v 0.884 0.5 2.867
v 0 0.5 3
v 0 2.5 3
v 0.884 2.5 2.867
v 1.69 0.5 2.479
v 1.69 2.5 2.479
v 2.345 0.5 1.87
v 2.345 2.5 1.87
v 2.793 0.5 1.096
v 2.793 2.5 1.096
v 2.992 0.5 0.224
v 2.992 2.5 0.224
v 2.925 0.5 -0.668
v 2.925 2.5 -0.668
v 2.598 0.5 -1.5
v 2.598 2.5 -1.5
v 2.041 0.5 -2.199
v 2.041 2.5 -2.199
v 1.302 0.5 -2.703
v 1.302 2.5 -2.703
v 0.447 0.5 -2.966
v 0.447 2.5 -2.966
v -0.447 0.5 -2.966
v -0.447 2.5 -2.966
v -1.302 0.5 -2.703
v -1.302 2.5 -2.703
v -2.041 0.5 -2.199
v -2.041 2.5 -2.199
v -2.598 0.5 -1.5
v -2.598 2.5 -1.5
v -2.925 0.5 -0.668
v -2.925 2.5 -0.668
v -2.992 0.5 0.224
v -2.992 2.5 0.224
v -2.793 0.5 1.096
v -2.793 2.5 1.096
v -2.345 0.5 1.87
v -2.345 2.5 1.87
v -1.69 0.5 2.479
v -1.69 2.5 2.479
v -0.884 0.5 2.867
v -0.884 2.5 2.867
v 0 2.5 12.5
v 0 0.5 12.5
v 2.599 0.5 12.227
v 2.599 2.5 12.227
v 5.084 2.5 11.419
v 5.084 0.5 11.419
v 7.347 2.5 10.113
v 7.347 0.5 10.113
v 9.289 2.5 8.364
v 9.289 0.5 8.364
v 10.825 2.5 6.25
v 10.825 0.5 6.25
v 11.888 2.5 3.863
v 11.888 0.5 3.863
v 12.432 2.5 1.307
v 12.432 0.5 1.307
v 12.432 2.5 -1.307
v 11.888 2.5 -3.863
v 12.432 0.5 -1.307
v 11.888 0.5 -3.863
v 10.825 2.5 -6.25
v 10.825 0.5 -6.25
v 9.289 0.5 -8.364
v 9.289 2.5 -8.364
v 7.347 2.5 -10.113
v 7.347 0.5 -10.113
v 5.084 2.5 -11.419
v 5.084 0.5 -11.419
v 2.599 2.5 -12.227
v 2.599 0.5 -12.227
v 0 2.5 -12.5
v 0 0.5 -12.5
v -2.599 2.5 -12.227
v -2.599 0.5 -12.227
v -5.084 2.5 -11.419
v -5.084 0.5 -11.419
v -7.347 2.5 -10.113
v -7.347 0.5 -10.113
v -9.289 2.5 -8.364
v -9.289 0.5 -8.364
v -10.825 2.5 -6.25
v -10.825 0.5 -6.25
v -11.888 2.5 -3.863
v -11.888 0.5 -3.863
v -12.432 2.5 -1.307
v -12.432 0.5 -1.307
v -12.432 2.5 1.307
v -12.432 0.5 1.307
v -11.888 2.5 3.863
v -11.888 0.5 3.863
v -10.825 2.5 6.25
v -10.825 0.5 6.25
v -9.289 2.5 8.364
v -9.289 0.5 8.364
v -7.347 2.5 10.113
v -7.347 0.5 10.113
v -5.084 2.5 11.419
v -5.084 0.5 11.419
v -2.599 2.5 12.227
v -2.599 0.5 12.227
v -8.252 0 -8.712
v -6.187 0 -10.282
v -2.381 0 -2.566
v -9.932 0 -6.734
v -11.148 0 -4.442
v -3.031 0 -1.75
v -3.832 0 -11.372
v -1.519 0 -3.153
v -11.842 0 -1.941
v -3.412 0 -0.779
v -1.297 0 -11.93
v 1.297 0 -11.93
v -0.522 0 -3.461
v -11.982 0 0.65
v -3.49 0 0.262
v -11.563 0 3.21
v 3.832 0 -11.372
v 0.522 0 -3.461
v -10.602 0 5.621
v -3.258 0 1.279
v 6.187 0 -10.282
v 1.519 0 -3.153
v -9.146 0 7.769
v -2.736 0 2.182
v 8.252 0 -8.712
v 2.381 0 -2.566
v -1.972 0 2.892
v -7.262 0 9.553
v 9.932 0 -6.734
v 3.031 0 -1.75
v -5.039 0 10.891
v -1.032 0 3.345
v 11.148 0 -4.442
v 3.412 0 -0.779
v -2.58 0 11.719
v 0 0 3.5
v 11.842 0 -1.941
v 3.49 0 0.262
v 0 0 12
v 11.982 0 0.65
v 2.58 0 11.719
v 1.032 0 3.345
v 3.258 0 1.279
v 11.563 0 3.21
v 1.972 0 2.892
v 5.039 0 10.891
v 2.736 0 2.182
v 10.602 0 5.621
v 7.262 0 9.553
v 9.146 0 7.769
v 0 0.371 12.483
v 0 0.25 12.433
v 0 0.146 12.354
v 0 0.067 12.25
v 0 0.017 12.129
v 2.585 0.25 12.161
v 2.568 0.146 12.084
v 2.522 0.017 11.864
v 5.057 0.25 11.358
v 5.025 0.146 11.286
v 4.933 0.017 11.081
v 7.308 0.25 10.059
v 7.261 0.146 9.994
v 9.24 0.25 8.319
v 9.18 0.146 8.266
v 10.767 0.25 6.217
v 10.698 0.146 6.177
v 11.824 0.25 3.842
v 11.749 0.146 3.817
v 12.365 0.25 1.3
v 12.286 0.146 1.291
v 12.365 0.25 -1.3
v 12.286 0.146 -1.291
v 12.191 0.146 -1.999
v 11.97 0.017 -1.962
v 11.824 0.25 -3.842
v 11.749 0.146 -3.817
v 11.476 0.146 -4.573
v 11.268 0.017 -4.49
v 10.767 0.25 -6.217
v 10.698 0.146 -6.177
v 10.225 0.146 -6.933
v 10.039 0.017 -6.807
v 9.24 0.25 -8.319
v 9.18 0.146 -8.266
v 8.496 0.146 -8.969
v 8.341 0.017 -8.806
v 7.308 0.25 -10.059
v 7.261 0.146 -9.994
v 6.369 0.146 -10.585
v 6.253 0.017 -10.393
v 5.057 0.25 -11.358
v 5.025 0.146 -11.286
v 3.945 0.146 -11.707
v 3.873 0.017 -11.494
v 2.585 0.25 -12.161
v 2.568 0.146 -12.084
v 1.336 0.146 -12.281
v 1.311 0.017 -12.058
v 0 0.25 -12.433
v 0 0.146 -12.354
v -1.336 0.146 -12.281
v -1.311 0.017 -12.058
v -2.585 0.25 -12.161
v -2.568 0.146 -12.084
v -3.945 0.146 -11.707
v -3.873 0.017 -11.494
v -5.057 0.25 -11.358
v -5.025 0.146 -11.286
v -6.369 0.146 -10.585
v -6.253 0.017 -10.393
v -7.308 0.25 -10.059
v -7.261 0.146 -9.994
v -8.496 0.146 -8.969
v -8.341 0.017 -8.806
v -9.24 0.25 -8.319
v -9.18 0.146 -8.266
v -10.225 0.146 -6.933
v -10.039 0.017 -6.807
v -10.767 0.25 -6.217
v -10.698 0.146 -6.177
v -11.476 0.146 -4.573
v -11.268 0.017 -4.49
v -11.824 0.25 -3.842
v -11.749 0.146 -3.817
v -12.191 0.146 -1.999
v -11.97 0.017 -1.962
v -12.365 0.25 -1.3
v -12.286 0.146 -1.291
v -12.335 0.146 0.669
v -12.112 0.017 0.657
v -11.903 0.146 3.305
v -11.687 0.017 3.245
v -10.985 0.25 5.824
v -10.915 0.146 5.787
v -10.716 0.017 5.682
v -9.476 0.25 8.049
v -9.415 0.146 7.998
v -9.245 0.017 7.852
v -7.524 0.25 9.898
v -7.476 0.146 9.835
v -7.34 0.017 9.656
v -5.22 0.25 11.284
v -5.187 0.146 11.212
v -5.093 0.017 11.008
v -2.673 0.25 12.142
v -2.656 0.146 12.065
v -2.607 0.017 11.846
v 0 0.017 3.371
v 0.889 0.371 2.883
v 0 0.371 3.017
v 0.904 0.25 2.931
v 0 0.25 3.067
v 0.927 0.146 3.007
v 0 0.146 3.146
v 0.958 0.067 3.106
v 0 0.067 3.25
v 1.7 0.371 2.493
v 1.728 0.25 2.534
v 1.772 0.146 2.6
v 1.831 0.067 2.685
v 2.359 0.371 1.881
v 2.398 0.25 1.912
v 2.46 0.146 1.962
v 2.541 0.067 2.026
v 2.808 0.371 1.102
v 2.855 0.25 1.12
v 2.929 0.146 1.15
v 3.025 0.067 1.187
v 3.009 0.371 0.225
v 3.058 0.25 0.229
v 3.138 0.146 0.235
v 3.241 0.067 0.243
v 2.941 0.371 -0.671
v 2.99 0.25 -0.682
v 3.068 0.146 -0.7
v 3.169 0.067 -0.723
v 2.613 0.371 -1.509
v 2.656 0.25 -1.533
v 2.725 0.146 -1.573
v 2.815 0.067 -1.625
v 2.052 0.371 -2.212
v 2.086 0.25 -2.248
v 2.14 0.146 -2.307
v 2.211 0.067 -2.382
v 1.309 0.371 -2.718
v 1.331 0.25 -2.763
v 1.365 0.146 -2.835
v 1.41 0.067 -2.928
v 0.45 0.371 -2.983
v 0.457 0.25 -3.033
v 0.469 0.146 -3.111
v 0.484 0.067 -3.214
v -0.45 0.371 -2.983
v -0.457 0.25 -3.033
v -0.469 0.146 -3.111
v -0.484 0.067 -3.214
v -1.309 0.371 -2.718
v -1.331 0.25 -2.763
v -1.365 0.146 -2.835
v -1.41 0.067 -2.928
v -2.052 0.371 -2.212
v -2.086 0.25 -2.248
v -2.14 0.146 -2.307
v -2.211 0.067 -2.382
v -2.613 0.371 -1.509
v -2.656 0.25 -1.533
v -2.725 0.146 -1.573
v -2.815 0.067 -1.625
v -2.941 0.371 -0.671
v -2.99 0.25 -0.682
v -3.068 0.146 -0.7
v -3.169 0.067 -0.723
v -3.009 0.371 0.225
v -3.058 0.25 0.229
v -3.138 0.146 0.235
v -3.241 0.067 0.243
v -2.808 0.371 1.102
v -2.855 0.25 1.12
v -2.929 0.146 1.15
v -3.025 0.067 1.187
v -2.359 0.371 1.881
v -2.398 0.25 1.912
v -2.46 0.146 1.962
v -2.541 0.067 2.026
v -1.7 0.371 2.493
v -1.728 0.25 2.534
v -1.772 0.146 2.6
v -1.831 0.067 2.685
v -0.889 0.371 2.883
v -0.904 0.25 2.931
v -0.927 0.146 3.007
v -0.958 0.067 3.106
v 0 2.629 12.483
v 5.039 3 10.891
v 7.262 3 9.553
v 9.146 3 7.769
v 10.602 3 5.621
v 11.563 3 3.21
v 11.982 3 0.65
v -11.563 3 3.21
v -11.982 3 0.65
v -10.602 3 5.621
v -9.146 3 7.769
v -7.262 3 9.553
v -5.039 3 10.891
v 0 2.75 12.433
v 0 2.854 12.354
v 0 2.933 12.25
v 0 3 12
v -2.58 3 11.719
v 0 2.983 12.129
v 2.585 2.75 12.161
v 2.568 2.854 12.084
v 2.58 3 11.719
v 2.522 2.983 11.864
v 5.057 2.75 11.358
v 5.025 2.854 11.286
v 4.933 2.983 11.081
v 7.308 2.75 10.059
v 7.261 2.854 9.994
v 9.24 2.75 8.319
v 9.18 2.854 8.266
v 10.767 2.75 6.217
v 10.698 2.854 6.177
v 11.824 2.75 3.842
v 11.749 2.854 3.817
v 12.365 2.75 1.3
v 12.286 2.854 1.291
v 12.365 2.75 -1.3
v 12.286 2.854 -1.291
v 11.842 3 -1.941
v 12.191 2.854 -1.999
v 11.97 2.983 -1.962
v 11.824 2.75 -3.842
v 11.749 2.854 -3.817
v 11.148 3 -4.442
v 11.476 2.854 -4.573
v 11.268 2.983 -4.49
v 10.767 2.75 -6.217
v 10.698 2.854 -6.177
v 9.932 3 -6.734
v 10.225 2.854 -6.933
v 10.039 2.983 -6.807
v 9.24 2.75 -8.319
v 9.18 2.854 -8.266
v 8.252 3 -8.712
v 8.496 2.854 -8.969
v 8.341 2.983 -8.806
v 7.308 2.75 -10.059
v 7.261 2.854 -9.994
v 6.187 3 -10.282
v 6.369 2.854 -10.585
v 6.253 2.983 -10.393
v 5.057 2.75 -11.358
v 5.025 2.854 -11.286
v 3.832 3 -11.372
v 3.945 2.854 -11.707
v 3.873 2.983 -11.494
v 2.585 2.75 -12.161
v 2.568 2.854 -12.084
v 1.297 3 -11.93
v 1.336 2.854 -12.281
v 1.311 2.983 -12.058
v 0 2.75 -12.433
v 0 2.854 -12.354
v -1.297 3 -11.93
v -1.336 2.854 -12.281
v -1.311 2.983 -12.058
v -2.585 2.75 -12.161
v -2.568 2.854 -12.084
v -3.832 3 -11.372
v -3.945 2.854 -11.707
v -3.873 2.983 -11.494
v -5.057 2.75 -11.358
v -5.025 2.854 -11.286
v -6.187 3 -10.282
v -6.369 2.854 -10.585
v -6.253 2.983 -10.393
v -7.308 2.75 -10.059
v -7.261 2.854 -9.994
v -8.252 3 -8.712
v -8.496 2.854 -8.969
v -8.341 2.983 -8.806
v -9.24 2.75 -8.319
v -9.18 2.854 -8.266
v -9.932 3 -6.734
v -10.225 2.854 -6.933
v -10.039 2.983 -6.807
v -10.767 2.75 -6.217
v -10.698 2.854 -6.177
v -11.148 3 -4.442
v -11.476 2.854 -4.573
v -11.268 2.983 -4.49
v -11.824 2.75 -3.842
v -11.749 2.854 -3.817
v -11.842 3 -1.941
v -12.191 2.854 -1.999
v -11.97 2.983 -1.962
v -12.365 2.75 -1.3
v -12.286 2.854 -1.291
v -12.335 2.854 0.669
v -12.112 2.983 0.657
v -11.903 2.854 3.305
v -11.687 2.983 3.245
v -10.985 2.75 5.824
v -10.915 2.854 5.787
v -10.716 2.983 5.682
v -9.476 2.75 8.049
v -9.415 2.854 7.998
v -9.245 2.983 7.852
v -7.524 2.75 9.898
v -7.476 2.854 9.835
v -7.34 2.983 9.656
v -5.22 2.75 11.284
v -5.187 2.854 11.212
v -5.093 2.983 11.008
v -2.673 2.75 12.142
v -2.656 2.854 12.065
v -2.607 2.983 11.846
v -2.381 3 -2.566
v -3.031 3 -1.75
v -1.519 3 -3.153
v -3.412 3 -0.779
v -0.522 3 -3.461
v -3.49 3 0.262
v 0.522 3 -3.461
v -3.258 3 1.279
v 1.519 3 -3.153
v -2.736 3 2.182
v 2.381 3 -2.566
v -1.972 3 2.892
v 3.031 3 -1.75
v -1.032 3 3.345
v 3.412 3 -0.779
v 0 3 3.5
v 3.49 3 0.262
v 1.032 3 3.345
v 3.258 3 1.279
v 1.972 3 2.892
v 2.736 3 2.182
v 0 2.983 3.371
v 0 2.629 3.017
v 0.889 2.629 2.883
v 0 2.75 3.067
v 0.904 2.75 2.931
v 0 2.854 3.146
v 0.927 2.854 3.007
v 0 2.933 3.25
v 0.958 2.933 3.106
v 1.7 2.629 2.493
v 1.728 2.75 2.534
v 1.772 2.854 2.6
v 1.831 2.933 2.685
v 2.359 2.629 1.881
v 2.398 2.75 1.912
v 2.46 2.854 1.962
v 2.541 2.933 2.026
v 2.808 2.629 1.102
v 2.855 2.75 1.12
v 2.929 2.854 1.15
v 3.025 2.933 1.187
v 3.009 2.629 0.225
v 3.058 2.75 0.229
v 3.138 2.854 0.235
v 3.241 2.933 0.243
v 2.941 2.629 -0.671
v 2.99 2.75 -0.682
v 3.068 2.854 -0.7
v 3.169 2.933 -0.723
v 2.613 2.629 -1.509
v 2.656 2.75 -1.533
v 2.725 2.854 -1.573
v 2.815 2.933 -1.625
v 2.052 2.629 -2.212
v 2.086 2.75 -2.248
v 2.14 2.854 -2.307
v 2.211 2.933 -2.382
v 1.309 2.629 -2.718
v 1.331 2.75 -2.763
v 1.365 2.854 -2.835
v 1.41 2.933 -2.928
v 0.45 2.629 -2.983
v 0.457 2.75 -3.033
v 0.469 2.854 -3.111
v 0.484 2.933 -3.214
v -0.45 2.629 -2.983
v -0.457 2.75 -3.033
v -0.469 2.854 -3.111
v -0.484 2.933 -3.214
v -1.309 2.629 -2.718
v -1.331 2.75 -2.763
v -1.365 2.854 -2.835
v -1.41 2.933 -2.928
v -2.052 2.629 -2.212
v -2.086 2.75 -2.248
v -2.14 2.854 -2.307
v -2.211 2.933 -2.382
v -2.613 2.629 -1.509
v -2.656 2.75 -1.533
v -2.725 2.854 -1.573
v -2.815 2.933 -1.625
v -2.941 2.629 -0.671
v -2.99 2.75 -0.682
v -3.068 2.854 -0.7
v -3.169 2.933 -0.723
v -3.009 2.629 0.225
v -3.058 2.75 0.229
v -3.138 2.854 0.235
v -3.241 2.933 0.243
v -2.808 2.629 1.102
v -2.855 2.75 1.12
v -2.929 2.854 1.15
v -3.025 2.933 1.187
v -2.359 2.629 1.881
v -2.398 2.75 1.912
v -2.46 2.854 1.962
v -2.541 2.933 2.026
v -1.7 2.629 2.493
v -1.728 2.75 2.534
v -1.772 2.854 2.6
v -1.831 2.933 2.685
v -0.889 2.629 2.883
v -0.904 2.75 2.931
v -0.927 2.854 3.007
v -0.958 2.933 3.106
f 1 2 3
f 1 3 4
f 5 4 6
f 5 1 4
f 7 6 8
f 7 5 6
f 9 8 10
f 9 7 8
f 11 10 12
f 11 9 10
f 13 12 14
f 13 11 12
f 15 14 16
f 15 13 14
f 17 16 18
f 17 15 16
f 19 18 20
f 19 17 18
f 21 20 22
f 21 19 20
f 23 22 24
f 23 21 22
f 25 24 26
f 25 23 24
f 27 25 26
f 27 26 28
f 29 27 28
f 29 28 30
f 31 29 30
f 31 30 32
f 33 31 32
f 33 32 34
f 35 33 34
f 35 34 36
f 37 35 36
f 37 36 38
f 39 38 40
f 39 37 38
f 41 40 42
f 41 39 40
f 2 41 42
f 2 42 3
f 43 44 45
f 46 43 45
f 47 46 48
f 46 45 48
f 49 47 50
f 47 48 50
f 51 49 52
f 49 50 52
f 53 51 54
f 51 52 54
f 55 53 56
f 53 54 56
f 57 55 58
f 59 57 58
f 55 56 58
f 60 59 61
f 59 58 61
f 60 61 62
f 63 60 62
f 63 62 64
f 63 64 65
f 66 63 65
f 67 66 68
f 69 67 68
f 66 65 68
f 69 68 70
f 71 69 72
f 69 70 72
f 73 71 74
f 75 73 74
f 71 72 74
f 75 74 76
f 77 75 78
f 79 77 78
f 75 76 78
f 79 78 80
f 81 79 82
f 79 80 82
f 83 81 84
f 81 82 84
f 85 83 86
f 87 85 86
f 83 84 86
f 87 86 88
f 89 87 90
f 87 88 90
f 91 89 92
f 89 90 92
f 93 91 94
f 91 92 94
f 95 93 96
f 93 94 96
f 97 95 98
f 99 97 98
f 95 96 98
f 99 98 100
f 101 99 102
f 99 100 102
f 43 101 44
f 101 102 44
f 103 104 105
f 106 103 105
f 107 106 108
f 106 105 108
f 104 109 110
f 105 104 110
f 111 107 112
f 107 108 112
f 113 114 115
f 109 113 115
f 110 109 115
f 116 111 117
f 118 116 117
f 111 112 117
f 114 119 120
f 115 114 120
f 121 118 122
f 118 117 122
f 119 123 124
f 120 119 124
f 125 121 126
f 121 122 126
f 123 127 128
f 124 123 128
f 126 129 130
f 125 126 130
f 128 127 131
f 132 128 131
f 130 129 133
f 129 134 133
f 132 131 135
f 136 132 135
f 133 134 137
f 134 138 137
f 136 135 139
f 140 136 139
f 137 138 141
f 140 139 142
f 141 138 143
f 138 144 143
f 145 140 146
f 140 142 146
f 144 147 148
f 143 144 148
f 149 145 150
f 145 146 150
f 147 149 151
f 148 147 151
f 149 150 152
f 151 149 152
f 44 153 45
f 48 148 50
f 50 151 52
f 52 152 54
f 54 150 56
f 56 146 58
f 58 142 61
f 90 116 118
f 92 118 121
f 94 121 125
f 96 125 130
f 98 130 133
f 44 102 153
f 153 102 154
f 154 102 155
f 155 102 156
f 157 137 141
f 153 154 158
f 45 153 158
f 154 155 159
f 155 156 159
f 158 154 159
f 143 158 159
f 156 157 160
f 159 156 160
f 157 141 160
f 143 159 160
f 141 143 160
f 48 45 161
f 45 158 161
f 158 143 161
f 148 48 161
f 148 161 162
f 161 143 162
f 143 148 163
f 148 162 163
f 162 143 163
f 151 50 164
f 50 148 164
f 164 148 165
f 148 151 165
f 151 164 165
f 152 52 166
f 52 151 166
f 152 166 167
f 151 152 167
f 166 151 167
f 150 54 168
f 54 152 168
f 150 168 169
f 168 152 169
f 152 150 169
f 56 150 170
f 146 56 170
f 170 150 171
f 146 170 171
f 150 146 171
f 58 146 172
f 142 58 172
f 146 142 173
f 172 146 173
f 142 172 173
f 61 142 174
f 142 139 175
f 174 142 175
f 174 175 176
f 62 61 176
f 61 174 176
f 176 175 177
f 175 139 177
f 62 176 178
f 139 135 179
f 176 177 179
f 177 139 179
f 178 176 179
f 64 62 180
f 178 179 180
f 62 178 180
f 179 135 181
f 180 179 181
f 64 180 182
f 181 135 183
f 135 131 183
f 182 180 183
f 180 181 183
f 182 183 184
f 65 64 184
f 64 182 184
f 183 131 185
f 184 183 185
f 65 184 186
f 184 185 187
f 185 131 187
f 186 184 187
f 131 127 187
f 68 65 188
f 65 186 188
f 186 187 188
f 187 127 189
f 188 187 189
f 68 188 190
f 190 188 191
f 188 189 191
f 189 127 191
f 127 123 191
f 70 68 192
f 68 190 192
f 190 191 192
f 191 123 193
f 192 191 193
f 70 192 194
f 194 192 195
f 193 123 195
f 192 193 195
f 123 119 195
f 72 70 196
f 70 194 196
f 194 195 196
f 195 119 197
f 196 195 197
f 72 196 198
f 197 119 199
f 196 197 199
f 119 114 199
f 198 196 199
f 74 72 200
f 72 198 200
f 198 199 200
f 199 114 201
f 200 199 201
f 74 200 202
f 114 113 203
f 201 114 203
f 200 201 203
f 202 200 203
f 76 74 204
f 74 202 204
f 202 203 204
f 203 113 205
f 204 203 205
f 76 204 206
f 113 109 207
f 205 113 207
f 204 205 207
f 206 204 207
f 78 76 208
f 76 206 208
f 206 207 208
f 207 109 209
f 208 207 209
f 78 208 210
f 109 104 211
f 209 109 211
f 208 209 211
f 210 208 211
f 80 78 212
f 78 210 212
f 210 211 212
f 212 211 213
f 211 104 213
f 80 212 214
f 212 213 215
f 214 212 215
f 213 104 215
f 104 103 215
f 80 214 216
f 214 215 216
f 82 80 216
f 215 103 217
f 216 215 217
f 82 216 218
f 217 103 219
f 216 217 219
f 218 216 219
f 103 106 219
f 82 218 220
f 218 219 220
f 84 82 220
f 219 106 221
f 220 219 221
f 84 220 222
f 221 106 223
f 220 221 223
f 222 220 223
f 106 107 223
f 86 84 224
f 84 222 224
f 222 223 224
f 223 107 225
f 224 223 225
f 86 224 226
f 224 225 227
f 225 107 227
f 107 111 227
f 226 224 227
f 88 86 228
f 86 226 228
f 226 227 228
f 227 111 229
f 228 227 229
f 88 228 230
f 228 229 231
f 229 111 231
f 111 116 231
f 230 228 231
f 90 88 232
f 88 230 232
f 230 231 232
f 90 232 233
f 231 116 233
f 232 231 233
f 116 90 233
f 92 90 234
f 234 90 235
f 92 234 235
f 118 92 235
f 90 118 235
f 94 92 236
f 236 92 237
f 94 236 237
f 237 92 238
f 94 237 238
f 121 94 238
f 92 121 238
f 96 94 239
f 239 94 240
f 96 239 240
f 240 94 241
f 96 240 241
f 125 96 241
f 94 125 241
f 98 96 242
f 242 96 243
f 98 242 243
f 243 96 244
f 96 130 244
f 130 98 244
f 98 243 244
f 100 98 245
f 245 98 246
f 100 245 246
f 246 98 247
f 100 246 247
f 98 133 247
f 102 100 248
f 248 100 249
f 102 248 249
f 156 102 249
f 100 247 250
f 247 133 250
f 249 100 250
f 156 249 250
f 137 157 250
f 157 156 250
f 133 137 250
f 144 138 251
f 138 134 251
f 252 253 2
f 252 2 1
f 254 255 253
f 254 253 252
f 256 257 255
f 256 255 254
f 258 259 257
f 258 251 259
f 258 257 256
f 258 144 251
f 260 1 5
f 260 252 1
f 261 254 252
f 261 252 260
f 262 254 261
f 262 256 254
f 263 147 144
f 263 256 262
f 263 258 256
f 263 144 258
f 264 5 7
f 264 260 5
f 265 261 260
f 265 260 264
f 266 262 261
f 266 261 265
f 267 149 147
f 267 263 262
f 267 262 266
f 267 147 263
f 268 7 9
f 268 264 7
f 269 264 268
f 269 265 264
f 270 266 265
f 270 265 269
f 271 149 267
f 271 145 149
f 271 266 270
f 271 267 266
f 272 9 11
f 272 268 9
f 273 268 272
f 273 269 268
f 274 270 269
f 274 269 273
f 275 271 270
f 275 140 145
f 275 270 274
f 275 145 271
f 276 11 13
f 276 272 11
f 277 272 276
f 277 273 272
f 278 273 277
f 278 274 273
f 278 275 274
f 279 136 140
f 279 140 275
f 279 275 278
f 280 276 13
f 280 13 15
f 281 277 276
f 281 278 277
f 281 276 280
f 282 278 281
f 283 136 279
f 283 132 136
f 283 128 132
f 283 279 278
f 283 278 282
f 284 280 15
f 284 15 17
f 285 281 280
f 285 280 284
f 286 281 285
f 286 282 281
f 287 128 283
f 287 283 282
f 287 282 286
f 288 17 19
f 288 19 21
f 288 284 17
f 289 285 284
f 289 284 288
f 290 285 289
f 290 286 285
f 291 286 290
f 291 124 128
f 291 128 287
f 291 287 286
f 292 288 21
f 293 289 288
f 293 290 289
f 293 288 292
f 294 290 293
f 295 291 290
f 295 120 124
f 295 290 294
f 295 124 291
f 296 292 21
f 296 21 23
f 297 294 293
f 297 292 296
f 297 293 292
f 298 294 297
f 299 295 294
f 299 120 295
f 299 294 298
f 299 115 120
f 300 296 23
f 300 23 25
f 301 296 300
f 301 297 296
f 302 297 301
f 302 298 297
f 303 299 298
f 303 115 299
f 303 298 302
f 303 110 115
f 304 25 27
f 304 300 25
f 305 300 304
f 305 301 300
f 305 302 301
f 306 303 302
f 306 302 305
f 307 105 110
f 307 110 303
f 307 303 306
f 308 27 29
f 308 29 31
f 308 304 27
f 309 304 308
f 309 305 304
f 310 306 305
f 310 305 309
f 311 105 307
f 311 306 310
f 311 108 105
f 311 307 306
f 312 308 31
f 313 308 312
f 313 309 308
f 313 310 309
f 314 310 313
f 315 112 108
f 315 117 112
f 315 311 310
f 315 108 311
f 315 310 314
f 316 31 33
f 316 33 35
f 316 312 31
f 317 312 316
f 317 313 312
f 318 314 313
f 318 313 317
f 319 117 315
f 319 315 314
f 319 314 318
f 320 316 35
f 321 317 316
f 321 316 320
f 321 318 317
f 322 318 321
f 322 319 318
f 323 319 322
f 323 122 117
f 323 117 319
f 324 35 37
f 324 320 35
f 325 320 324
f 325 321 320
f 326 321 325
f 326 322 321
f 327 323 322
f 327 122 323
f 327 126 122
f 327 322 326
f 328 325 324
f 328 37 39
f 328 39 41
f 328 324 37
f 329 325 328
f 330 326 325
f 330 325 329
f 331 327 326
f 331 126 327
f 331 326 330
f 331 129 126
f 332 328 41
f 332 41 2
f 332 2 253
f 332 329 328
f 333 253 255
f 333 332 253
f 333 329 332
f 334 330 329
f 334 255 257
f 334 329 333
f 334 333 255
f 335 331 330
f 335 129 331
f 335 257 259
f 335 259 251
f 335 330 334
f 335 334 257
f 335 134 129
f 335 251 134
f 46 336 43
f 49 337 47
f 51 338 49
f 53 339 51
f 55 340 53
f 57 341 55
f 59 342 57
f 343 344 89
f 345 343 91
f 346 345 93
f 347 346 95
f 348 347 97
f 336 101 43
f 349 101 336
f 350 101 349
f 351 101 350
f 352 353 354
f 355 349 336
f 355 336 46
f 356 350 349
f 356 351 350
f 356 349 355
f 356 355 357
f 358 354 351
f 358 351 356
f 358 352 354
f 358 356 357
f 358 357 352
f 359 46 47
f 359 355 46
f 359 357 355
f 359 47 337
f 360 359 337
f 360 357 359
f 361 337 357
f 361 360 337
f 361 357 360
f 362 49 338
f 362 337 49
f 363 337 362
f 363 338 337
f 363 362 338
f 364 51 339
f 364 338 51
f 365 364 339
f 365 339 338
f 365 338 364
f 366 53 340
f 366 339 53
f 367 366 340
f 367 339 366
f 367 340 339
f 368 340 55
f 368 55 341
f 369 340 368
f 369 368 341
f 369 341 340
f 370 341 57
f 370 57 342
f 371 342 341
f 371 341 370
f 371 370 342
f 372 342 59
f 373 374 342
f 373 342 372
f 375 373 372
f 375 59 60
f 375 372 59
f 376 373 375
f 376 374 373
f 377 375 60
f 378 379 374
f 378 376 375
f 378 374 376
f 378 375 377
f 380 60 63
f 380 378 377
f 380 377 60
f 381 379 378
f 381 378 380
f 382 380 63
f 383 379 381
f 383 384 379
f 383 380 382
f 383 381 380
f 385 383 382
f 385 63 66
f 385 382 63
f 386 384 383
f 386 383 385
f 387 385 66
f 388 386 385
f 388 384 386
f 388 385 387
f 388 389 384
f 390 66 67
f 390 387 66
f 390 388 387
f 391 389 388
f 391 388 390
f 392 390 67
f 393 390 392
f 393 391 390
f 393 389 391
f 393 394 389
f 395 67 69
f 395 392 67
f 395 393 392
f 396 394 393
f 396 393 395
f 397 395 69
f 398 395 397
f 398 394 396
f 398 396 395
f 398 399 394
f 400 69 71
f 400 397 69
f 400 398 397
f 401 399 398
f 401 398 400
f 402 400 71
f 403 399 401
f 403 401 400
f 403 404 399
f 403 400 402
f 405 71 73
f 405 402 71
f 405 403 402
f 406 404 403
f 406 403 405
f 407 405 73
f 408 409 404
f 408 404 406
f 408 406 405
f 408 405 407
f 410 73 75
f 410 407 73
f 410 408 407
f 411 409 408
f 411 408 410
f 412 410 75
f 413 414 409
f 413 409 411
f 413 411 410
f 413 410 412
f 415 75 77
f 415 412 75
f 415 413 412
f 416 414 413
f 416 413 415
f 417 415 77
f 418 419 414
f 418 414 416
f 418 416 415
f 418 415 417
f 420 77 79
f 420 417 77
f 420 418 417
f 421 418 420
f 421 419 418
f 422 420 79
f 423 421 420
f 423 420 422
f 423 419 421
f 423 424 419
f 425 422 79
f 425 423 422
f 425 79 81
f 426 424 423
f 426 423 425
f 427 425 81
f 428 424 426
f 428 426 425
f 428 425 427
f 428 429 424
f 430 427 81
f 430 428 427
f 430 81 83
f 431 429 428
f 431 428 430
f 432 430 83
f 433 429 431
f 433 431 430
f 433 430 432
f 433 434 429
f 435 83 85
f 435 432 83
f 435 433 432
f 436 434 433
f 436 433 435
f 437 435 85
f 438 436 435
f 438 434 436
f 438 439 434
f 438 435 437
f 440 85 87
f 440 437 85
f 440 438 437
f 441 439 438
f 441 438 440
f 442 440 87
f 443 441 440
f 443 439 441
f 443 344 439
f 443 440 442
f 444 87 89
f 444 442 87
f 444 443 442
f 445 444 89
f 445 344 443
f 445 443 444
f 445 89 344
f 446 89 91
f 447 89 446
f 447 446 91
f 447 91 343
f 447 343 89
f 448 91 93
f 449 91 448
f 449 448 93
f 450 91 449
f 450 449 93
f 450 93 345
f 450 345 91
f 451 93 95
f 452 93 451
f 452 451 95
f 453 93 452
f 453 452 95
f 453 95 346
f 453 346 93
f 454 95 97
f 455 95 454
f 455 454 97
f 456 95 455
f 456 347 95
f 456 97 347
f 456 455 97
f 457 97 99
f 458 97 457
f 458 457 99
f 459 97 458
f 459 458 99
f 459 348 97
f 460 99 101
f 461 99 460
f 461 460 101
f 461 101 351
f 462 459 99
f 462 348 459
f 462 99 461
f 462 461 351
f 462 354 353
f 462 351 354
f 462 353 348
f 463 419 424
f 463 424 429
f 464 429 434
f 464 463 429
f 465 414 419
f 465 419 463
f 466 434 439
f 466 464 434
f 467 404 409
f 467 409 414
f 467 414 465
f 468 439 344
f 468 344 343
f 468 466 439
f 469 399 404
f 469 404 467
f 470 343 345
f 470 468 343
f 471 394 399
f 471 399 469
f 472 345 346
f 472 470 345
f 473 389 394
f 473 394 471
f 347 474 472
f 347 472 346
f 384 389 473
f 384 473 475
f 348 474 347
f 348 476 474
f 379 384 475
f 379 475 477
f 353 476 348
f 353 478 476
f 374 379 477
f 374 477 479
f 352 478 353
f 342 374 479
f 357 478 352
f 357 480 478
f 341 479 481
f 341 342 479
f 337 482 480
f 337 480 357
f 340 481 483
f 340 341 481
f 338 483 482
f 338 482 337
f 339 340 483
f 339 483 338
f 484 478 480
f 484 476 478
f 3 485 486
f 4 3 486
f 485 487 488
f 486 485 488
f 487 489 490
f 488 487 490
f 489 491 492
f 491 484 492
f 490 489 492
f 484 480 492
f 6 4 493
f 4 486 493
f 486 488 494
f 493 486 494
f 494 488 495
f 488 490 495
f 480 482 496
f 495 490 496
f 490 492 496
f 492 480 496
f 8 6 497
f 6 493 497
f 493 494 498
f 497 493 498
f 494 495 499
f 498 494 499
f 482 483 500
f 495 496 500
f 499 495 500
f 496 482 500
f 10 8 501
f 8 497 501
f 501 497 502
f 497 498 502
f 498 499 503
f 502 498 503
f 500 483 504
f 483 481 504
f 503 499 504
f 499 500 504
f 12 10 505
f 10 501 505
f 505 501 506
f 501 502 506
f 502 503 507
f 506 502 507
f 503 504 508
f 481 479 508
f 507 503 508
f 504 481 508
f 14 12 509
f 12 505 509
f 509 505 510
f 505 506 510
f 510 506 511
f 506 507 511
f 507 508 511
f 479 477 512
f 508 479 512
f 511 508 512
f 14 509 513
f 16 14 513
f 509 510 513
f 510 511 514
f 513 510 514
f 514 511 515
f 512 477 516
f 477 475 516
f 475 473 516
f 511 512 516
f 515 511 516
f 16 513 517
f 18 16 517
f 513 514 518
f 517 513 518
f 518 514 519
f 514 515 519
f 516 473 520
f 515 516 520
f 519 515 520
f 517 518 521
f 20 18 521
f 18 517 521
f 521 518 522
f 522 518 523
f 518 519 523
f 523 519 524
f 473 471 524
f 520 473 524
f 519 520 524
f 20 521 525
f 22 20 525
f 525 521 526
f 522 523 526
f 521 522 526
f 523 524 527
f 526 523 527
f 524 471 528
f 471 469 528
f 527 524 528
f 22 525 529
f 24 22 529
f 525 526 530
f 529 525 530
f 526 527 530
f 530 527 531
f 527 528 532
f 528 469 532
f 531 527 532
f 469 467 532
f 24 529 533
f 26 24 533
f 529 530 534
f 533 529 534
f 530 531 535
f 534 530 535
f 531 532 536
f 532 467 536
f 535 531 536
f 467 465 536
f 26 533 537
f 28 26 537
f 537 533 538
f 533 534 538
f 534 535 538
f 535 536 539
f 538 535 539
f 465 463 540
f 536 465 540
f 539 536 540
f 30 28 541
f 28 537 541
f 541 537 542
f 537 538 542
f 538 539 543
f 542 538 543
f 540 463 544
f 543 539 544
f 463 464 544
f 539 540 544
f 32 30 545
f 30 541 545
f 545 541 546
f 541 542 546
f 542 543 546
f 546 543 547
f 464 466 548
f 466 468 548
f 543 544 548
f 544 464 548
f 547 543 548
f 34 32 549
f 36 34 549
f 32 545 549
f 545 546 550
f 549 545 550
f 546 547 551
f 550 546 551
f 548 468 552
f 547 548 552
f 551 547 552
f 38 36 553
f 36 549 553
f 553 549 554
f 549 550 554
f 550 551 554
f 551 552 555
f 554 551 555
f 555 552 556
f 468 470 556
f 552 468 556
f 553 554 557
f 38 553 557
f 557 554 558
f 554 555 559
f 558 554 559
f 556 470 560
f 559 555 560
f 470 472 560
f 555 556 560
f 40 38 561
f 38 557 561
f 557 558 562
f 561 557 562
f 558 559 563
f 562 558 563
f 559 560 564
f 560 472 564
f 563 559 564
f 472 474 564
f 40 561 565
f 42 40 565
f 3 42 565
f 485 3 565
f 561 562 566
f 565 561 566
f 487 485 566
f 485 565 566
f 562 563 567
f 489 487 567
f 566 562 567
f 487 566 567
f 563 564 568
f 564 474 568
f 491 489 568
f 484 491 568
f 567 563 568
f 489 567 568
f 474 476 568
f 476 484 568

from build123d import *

# Parameters (mm, degrees)
CROQUIS1_R              = 12.5
CROQUIS1_R_2            = 3
SALIENTE_EXTRUIR1_DEPTH = 3
REDONDEO1_R             = 0.5


with BuildPart() as part:
    # Croquis1 → Saliente-Extruir1 (new body)
    with BuildSketch(Plane(origin=(0, 0, 0), x_dir=(1, 0, 0), z_dir=(0, 1, 0))):
        with Locations(Location((0, 0, 0), (0, 0, 270))):
            Circle(CROQUIS1_R)
        with Locations(Location((0, 0, 0), (0, 0, 270))):
            Circle(CROQUIS1_R_2, mode=Mode.SUBTRACT)
    extrude(amount=SALIENTE_EXTRUIR1_DEPTH)

    # Redondeo1
    redondeo1_edges = [part.edges().sort_by_distance(p)[0] for p in [
        (0, 0, -12.5),
        (0, 3, -12.5),
        (0, 0, -3),
        (0, 3, -3),
    ]]
    fillet(redondeo1_edges, radius=REDONDEO1_R)


solid = part.part
